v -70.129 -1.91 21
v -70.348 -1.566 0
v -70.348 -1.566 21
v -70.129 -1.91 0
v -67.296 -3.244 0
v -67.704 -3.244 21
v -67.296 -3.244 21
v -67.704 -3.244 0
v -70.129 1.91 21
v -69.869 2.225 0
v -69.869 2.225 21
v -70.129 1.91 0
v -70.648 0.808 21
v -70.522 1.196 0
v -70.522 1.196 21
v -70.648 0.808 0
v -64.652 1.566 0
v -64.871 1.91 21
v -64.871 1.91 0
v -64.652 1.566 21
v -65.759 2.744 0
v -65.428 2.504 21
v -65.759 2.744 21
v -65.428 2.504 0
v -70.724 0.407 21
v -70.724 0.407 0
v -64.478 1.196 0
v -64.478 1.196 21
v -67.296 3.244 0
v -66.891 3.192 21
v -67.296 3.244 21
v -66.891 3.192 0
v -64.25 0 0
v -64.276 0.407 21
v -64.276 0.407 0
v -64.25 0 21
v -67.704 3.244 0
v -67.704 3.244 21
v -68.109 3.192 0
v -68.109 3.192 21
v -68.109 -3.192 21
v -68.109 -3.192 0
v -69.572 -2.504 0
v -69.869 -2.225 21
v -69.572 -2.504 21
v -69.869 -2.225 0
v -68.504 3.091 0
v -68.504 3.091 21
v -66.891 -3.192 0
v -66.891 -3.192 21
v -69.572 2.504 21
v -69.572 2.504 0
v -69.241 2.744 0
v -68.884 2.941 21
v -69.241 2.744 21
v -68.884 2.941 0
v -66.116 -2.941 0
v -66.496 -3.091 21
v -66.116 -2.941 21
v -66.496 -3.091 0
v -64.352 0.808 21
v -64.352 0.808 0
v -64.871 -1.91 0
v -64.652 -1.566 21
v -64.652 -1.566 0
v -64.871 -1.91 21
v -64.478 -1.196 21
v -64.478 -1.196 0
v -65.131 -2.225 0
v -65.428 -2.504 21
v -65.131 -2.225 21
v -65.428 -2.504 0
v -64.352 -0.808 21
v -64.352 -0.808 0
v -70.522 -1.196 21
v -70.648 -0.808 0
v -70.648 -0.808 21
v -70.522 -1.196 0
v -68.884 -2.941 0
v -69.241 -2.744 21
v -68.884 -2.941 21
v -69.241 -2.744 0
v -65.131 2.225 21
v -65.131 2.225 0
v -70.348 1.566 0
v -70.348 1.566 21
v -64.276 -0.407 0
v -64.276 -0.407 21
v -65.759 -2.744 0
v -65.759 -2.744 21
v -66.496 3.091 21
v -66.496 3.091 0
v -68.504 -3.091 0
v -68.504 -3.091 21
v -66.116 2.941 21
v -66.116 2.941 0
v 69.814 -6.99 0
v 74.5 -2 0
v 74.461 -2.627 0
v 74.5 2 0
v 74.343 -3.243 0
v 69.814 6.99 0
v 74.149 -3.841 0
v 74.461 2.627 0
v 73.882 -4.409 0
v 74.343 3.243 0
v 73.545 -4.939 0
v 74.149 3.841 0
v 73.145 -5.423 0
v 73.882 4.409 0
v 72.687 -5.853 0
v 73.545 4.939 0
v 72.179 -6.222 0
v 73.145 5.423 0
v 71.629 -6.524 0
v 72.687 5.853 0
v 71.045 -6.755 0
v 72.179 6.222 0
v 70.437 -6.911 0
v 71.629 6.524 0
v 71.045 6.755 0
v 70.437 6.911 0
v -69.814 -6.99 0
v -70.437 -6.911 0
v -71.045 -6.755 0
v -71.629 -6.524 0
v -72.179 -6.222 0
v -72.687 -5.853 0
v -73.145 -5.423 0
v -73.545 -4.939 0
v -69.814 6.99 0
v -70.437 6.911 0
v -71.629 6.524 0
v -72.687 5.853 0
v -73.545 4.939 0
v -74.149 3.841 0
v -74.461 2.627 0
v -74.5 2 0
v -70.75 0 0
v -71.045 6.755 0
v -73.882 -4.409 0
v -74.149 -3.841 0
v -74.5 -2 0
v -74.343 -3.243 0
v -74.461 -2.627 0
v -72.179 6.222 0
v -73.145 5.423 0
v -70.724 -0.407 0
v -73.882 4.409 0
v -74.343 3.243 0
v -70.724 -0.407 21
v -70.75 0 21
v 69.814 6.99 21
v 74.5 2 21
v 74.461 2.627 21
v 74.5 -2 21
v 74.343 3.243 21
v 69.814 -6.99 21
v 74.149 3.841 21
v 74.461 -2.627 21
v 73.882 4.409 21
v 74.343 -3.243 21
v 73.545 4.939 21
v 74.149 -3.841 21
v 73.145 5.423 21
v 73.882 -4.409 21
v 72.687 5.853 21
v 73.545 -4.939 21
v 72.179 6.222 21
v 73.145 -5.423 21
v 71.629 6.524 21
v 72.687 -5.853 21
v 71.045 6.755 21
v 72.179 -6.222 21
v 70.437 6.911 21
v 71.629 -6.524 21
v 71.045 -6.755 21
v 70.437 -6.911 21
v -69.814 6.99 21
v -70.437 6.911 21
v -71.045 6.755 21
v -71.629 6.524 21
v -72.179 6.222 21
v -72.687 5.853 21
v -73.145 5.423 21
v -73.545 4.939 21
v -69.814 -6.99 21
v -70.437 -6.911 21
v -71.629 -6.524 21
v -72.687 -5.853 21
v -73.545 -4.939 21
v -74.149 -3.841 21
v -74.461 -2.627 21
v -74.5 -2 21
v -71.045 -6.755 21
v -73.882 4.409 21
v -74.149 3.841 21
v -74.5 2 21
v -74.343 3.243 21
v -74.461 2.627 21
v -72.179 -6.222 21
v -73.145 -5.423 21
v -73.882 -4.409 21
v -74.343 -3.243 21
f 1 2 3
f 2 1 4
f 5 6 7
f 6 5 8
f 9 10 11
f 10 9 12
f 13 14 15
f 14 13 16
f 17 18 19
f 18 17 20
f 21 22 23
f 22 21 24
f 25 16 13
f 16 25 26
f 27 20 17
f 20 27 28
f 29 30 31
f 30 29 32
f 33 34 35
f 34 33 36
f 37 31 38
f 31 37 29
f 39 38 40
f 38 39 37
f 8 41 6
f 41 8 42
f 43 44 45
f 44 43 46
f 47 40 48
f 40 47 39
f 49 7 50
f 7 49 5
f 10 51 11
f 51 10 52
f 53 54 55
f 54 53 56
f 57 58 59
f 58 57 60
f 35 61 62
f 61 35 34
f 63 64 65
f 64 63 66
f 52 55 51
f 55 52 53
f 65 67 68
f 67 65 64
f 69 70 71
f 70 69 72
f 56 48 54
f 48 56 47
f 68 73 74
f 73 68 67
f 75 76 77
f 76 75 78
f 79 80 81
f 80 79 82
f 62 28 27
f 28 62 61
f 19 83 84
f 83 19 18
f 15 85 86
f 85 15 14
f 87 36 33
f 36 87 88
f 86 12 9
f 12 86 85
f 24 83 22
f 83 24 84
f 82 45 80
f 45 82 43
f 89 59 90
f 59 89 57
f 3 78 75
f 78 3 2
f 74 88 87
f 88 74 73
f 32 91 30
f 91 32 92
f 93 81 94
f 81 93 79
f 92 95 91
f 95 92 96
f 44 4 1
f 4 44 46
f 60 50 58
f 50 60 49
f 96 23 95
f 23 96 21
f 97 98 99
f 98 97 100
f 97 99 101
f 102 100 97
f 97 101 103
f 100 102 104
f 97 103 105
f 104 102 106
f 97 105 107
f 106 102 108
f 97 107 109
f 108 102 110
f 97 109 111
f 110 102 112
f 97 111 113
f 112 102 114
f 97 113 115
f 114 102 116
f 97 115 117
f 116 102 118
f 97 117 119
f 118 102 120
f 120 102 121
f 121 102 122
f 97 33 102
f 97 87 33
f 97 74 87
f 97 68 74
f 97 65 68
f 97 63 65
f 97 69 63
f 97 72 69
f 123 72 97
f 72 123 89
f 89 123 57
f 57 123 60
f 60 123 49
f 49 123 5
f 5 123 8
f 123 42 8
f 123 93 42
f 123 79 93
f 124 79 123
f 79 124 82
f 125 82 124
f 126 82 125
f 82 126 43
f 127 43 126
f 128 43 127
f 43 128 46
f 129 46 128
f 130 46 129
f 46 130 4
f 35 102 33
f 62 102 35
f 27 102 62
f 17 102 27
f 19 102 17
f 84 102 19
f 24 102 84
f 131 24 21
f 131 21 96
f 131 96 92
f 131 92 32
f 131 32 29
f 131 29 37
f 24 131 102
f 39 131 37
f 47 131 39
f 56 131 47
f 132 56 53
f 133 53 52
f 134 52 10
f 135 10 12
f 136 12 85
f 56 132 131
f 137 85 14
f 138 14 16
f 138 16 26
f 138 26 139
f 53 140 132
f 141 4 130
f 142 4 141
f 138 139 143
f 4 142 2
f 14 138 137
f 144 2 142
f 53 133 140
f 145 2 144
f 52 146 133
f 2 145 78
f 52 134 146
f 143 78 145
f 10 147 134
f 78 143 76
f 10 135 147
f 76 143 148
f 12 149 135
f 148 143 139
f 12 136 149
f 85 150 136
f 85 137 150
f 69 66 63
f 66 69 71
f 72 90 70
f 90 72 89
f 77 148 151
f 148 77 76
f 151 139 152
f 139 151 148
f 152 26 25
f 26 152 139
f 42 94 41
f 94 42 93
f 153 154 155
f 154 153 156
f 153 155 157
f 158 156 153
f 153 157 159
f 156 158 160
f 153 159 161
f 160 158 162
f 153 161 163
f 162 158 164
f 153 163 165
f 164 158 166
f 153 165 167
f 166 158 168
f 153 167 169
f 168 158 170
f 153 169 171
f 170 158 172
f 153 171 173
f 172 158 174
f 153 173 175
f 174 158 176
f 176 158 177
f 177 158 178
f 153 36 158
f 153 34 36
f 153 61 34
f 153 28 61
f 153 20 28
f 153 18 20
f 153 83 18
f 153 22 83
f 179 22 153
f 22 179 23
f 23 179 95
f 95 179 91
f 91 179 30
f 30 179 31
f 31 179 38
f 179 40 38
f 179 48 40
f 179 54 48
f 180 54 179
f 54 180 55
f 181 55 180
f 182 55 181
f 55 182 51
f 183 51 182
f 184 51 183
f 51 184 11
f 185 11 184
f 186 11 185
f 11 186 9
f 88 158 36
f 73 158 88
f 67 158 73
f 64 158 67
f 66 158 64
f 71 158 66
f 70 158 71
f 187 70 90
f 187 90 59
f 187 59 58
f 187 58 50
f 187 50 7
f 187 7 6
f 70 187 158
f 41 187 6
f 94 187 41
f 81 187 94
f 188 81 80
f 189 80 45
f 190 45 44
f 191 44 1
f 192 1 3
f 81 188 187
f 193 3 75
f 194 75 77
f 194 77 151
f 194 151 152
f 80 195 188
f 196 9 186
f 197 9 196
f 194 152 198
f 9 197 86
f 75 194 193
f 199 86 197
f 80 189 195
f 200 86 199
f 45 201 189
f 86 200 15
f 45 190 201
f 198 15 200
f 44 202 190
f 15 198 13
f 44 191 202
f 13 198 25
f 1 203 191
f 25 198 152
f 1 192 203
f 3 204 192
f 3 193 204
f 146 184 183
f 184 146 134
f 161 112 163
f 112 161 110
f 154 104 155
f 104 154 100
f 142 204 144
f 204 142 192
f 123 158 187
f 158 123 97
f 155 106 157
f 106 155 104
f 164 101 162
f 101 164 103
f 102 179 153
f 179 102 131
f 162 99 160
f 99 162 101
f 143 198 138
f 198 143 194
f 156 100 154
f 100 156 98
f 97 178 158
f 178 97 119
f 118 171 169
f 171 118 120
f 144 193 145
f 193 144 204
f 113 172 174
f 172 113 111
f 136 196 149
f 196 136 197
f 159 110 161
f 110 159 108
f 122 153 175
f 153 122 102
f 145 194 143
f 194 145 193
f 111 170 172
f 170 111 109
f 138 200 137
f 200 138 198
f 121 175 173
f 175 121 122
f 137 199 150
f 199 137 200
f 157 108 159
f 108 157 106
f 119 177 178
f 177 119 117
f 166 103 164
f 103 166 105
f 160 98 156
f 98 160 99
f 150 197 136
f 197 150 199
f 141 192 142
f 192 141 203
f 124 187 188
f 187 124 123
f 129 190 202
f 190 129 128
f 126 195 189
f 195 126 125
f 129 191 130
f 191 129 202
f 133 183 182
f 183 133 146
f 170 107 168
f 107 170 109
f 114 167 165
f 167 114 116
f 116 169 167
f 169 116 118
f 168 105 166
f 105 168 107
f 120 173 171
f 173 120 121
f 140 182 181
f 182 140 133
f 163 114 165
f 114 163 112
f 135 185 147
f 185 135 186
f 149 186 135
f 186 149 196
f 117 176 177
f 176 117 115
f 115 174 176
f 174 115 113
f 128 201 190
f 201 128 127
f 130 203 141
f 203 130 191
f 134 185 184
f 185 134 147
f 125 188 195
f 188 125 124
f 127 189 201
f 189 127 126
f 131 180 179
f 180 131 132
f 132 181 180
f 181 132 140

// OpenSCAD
$fn = 50;


difference() {
	union() {
		hull() {
			translate(v = [-69.5000000000, 2.0000000000, 0]) {
				cylinder(h = 21, r = 5);
			}
			translate(v = [69.5000000000, 2.0000000000, 0]) {
				cylinder(h = 21, r = 5);
			}
			translate(v = [-69.5000000000, -2.0000000000, 0]) {
				cylinder(h = 21, r = 5);
			}
			translate(v = [69.5000000000, -2.0000000000, 0]) {
				cylinder(h = 21, r = 5);
			}
		}
	}
	union() {
		translate(v = [-67.5000000000, 0.0000000000, 0]) {
			cylinder(h = 21, r = 3.2500000000);
		}
		translate(v = [-67.5000000000, 0.0000000000, 0]) {
			cylinder(h = 21, r = 1.8000000000);
		}
		translate(v = [-67.5000000000, 0.0000000000, 0]) {
			cylinder(h = 21, r = 1.8000000000);
		}
		translate(v = [-67.5000000000, 0.0000000000, 0]) {
			cylinder(h = 21, r = 1.8000000000);
		}
	}
}
